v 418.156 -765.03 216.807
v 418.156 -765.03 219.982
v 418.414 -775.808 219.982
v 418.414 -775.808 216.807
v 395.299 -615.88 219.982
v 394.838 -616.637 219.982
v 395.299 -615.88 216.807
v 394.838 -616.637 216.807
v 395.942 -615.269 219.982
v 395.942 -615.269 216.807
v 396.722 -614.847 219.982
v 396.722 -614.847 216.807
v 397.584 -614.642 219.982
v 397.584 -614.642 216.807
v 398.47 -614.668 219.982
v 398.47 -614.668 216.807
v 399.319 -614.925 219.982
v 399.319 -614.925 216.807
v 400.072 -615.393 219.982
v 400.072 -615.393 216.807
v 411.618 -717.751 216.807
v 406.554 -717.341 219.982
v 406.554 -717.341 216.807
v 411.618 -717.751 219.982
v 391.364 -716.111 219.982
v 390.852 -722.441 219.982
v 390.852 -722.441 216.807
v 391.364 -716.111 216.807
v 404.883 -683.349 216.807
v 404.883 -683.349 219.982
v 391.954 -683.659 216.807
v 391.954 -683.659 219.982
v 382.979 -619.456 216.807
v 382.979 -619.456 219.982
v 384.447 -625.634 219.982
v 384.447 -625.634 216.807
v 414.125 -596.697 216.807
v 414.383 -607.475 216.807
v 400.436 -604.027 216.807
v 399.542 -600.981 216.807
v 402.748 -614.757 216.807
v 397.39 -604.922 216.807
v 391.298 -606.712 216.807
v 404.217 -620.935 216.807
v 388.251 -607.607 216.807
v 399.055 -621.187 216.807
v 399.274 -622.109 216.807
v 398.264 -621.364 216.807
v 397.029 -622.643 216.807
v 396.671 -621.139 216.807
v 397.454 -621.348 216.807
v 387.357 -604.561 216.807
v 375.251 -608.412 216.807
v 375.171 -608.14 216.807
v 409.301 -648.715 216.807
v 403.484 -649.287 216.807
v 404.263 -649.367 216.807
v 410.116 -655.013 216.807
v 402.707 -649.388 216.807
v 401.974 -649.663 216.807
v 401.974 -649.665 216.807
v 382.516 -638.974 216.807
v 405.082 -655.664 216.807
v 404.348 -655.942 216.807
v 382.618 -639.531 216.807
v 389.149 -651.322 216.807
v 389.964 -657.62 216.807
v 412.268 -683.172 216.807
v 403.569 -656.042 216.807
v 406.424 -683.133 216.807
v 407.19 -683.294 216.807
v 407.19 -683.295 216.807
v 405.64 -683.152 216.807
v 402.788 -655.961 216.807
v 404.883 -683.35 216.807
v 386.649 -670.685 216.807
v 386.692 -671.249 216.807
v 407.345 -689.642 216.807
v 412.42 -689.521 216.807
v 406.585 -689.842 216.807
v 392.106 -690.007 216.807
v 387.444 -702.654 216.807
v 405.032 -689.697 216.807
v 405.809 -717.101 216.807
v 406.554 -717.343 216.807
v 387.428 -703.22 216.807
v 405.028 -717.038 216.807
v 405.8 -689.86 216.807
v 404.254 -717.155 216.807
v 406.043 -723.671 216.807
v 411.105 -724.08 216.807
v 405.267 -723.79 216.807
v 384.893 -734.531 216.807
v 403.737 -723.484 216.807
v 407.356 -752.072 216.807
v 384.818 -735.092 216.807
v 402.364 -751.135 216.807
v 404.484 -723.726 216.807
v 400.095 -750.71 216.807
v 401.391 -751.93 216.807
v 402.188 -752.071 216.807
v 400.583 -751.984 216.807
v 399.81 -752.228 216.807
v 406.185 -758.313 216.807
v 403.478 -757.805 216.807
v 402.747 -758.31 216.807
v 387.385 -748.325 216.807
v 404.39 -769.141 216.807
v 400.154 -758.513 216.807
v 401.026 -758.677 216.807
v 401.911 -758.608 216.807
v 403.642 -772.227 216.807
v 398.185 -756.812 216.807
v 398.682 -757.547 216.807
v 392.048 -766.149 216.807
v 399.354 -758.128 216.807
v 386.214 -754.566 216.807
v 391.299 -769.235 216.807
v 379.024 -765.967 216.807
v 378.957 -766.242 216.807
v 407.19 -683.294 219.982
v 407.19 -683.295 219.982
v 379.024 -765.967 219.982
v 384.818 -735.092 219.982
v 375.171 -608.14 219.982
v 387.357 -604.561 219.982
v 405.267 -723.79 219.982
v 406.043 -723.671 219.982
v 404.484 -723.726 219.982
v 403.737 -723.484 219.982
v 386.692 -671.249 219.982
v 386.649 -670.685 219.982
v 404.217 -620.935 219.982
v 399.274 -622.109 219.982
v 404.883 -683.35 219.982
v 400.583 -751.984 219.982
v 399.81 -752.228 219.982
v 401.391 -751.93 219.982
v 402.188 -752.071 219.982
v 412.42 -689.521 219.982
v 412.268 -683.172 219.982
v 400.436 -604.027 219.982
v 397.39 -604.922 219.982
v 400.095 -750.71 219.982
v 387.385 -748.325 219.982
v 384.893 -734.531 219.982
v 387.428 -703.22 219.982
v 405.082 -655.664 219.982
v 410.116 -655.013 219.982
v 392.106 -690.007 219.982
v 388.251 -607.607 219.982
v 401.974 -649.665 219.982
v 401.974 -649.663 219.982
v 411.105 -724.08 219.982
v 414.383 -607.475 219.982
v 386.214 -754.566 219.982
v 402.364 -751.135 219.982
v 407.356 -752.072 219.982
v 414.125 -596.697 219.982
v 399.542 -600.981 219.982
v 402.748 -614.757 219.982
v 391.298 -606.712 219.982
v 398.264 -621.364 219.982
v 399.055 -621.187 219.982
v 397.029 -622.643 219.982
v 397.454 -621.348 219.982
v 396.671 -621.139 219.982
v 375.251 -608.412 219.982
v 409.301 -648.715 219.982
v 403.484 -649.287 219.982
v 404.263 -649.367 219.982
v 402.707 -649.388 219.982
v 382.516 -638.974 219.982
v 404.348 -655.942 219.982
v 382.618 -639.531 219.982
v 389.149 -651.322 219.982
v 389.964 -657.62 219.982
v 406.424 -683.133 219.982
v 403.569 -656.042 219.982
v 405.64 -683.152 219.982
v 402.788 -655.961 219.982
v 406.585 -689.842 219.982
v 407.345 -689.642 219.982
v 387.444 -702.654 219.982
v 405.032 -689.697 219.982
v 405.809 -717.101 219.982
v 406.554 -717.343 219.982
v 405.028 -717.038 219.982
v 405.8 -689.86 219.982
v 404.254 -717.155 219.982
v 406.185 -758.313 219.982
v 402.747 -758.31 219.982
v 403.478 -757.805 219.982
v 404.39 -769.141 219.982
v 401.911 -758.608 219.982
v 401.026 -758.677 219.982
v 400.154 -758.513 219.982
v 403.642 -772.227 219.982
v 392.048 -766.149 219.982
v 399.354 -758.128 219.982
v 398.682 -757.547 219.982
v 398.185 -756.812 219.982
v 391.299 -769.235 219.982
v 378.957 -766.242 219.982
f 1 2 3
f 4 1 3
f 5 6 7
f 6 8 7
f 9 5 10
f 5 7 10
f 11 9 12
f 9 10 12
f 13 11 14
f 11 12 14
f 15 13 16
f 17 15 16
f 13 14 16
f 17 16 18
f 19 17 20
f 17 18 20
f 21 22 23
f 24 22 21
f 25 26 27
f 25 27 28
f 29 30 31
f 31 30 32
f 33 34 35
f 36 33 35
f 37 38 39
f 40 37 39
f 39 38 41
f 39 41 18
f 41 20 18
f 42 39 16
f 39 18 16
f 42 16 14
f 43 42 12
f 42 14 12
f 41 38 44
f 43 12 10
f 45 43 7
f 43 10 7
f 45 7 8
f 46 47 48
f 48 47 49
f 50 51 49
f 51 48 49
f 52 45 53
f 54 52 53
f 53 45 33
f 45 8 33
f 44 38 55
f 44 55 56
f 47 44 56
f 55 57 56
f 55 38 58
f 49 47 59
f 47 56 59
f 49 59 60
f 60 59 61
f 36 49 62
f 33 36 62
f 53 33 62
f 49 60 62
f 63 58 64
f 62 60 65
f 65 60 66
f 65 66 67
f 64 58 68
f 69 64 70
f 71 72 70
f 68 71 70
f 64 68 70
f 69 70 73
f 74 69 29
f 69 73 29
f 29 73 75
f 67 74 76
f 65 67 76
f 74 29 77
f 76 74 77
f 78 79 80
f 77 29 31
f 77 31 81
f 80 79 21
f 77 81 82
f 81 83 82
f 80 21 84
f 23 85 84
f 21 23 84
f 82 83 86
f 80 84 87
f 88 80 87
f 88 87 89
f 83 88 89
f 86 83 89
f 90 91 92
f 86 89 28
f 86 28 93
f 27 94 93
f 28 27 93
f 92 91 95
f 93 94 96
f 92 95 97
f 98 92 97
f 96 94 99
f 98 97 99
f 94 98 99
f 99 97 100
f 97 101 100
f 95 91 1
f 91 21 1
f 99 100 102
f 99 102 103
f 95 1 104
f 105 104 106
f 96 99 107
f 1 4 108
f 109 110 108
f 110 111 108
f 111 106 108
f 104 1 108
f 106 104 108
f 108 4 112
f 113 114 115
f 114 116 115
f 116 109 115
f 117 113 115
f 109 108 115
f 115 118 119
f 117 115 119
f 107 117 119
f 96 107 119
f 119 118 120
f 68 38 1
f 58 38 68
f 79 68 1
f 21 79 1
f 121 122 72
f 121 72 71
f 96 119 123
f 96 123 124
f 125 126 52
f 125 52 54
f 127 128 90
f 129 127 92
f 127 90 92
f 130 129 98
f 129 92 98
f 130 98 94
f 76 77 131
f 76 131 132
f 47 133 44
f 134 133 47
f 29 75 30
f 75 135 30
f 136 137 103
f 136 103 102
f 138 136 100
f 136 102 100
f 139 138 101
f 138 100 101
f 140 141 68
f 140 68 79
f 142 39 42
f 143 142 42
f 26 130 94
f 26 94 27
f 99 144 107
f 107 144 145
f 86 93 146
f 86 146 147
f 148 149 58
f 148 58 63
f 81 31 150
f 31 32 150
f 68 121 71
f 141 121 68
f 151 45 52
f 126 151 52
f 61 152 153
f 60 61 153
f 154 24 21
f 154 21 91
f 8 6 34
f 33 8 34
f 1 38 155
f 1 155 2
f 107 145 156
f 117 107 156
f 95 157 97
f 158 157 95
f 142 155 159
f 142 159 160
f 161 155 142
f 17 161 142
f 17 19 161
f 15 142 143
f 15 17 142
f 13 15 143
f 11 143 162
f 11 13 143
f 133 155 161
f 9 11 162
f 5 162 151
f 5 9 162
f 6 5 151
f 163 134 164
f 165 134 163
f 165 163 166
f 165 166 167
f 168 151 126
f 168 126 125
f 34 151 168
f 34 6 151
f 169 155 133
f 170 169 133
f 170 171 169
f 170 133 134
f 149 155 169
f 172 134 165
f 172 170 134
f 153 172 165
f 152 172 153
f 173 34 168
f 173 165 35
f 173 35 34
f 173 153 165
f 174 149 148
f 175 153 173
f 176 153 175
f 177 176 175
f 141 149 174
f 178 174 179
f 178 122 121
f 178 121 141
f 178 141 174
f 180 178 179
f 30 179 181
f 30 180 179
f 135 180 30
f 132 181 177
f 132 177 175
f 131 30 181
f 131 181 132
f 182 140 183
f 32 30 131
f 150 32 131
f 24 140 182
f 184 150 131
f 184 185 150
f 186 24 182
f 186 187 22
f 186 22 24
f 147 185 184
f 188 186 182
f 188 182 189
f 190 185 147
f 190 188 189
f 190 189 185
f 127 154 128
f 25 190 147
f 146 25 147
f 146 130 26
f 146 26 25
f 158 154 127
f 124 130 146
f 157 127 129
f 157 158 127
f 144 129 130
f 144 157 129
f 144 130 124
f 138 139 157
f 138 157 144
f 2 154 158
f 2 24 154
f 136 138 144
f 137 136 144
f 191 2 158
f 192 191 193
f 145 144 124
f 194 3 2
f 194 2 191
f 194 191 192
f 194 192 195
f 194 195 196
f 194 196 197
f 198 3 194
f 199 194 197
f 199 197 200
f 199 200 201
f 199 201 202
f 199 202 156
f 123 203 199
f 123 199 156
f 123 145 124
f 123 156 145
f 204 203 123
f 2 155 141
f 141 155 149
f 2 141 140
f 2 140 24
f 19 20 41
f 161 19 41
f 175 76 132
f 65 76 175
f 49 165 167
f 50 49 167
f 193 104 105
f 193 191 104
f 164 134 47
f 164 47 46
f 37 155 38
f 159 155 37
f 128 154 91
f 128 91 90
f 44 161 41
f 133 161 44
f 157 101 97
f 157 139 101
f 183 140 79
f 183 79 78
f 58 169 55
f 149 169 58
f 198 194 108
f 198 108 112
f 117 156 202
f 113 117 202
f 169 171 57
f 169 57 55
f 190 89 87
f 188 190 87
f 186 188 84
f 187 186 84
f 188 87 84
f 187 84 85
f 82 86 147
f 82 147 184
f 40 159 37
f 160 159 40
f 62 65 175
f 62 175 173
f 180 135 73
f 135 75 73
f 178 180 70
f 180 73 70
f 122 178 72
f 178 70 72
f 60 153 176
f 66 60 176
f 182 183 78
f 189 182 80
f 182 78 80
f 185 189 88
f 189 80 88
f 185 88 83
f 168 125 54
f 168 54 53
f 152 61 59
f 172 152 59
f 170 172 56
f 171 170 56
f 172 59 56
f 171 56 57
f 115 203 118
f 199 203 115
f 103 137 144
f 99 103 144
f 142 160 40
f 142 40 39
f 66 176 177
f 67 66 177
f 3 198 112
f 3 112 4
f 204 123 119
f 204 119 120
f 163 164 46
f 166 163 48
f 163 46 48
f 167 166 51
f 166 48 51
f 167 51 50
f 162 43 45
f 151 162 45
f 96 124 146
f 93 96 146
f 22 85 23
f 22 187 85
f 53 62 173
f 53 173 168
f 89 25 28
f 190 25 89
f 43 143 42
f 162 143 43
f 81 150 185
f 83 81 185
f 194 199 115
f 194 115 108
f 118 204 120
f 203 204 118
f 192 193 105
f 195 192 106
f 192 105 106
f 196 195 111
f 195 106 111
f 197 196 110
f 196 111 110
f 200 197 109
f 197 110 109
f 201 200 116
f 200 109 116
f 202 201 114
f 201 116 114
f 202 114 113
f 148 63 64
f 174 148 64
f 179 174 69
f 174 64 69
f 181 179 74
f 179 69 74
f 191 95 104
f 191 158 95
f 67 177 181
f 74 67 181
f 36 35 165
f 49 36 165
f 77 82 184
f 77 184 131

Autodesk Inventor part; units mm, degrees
ref_plane "YZ Plane" through (0, 0, 0) normal (1, 0, 0) x (0, 1, 0)
ref_plane "XZ Plane" through (0, 0, 0) normal (0, 1, 0) x (-1, 0, 0)
ref_plane "Work Plane2" through (388.0538, -686.9281, 216.8066) normal (0, 0, 1) x (-0.9917, -0.1283, 0)
sketch "Sketch3" plane through (388.0538, -686.9281, 216.8066) normal (0, 0, 1) x (-0.9917, -0.1283, 0)
  line L0 (4.3583, 15.8159) -> (10.8533, 46.3726) construction
  line L1 (1.0044, -15.8113) -> (4.2698, 15.2569) construction
  line L2 (1.0044, -15.8113) -> (4.2698, 15.2569) construction
  line L3 (0.9748, -47.6157) -> (0.9748, -16.3764) construction
  line L4 (0.9748, -47.6157) -> (0.9748, -16.3764) construction
  line L5 (4.2698, -79.2491) -> (1.0044, -48.1809) construction
  line L6 (4.2698, -79.2491) -> (1.0044, -48.1809) construction
  line L7 (10.9998, 46.9192) -> (20.6533, 76.6296) construction
  line L8 (4.3583, 15.8159) -> (10.8533, 46.3726) construction
  line L9 (10.9998, 46.9192) -> (20.6533, 76.6296) construction
  line L10 (20.6533, 76.6296) -> (-103.8397, 124.4179) construction
  line L11 (-117.8064, 81.4327) -> (10.9998, 46.9192) construction
  line L12 (10.8533, 46.3726) -> (-117.9529, 80.8861) construction
  line L13 (-127.3499, 36.6764) -> (4.3583, 15.8159) construction
  line L14 (4.2698, 15.2569) -> (-127.4385, 36.1175) construction
  line L15 (0.9748, -16.3764) -> (-132.1925, -9.3974) construction
  line L16 (-132.1629, -8.8323) -> (1.0044, -15.8113) construction
  line L17 (1.0044, -48.1809) -> (-132.1629, -55.1599) construction
  line L18 (-132.1925, -54.5947) -> (0.9748, -47.6157) construction
  line L19 (-127.4385, -100.1096) -> (4.2698, -79.2491) construction
  line L20 (19.0965, 77.2271) -> (9.3891, 47.3508)
  line L21 (9.3891, 47.3508) -> (9.2426, 46.8041)
  line L22 (9.2426, 46.8041) -> (2.7113, 16.0767)
  line L23 (2.7113, 16.0767) -> (2.6228, 15.5178)
  line L24 (2.6228, 15.5178) -> (-0.6609, -15.724)
  line L25 (-0.6609, -15.724) -> (-0.6905, -16.2891)
  line L26 (-0.6905, -16.2891) -> (-0.6905, -47.703)
  line L27 (-0.6905, -47.703) -> (-0.6609, -48.2681)
  line L28 (-0.6609, -48.2681) -> (2.6228, -79.5099)
  line L29 (2.6228, -79.5099) -> (-36.3059, -75.4184)
  line L30 (-36.3059, -75.4184) -> (-19.8322, 81.3187)
  line L31 (-19.8322, 81.3187) -> (19.0965, 77.2271)
  line L32 (-127.4385, 36.1175) -> (-129.1369, 19.9578) construction
  point P0 (296.7492, -731.0239)
  dimension "d32" = 1.6652
  dimension "d33" = 1.6652
  dimension "d34" = 1.6652
  dimension "d35" = 1.6652
  dimension "d36" = 1.6652
  dimension "d37" = 29.21
extrude "Extrusion3" add sketch "Sketch3" along normal blind 3.175
sketch "Sketch5" plane through (388.0538, -686.9281, 219.9816) normal (0, 0, 1) x (0.9917, 0.1283, 0)
  line L0 (-19.0965, -77.2271) -> (19.8322, -81.3187) projected
  line L1 (-19.0965, -77.2271) -> (-19.1979, -77.4913)
  line L2 (-19.1979, -77.4913) -> (-7.3415, -82.0426)
  line L3 (4.515, -86.5938) -> (18.7052, -92.0409)
  line L4 (19.8322, -81.3187) -> (36.3059, 75.4184) projected
  line L5 (19.8322, -81.3187) -> (18.7052, -92.0409)
  line L6 (-18.0601, -74.5272) -> (-19.1979, -77.4913) construction
  line L7 (36.3059, 75.4184) -> (37.4328, 86.1406)
  line L8 (37.4328, 86.1406) -> (22.4202, 83.7628)
  line L9 (9.8766, 81.7761) -> (-2.6671, 79.7894)
  line L10 (36.3059, 75.4184) -> (-2.6228, 79.5099) projected
  line L11 (-2.6671, 79.7894) -> (-2.6228, 79.5099)
  line L12 (-2.6671, 79.7894) -> (-2.1704, 76.6535) construction
  line L13 (1.5509, -85.456) -> (-4.3773, -83.1804) projected
  line L14 (2.6887, -82.4919) -> (1.5509, -85.456) projected
  line L15 (-3.2395, -80.2163) -> (2.6887, -82.4919) projected
  line L16 (-3.2395, -80.2163) -> (-4.3773, -83.1804) projected
  line L17 (19.781, 80.1302) -> (13.5092, 79.1369) projected
  line L18 (19.2843, 83.2662) -> (19.781, 80.1302) projected
  line L19 (13.0125, 82.2728) -> (19.2843, 83.2662) projected
  line L20 (13.0125, 82.2728) -> (13.5092, 79.1369) projected
  line L21 (-4.3773, -83.1804) -> (-7.3415, -82.0426) projected
  line L22 (-3.2395, -80.2163) -> (-4.3773, -83.1804) projected
  line L23 (-6.2036, -79.0785) -> (-3.2395, -80.2163) projected
  line L24 (-7.3415, -82.0426) -> (-6.2036, -79.0785) projected
  line L25 (4.515, -86.5938) -> (1.5509, -85.456) projected
  line L26 (5.6528, -83.6297) -> (4.515, -86.5938) projected
  line L27 (2.6887, -82.4919) -> (5.6528, -83.6297) projected
  line L28 (2.6887, -82.4919) -> (1.5509, -85.456) projected
  line L29 (22.9169, 80.6269) -> (19.781, 80.1302) projected
  line L30 (22.4202, 83.7628) -> (22.9169, 80.6269) projected
  line L31 (19.2843, 83.2662) -> (22.4202, 83.7628) projected
  line L32 (19.2843, 83.2662) -> (19.781, 80.1302) projected
  line L33 (13.5092, 79.1369) -> (10.3733, 78.6402) projected
  line L34 (13.0125, 82.2728) -> (13.5092, 79.1369) projected
  line L35 (9.8766, 81.7761) -> (13.0125, 82.2728) projected
  line L36 (10.3733, 78.6402) -> (9.8766, 81.7761) projected
  point P0 (-296.7492, 731.0239)
  point P1 (19.781, 80.1302)
  point P2 (13.5092, 79.1369)
  point P3 (2.6887, -82.4919)
extrude "Extrusion4" add sketch "Sketch5" against normal blind 3.175 contours L10 L11 L9 L36 L33 L17 L29 L30 L8 L7 | L0 L5 L3 L26 L27 L15 L23 L24 L2 L1
sketch "Sketch6" plane through (388.0538, -686.9281, 219.9816) normal (0, 0, 1) x (0.9917, 0.1283, 0)
  line L0 (16.6451, 79.6336) -> (18.6318, 67.0899) construction
  line L1 (-0.2754, -81.3541) -> (4.2759, -69.4976) construction
  line L2 (18.7052, -92.0409) -> (37.4328, 86.1406) construction
  line L3 (28.069, -2.9502) -> (17.9647, -1.8882) construction
  line L4 (-6.2036, -79.0785) -> (5.6528, -83.6297) construction
  line L5 (22.9169, 80.6269) -> (10.3733, 78.6402) construction
  point P0 (-296.7492, 731.0239)
  dimension "d23" = 12.7
  dimension "d24" = 12.7
  dimension "d55" = 10.16
hole "Hole2" at (401.2076, -755.3034, 219.9816) at (397.9274, -618.0027, 219.9816) at (406.1123, -686.4967, 219.9816) direction (0, 0, -1) diameter 6.7564 depth 13.6144 clearance for "Flat Head Machine Screw (82)" size "1/4" standard "Ansi Unified Screw Threads"
sketch "Sketch7" plane through (388.0538, -686.9281, 219.9816) normal (0, 0, 1) x (0.9917, 0.1283, 0)
  line L0 (0.6609, 15.724) -> (-2.6228, -15.5178) construction
  line L1 (-0.981, 0.1031) -> (10.3864, -1.0917) construction
  line L2 (3.6239, -3.5734) -> (16.4852, -4.9251)
  line L3 (16.4852, -4.9251) -> (17.1489, 1.3901)
  line L4 (17.1489, 1.3901) -> (4.2877, 2.7418)
  line L5 (4.2877, 2.7418) -> (3.6239, -3.5734)
  line L6 (3.6239, -3.5734) -> (17.1489, 1.3901) construction
  line L7 (16.4852, -4.9251) -> (4.2877, 2.7418) construction
  circle A0 centre (17.9647, -1.8882) radius 3.3782 construction
  line L8 (10.8679, -38.2669) -> (-1.7816, -35.5781)
  line L9 (-1.7816, -35.5781) -> (-0.4614, -29.3669)
  line L10 (-0.4614, -29.3669) -> (12.1881, -32.0556)
  line L11 (12.1881, -32.0556) -> (10.8679, -38.2669)
  line L12 (10.8679, -38.2669) -> (-0.4614, -29.3669) construction
  line L13 (-1.7816, -35.5781) -> (12.1881, -32.0556) construction
  line L14 (-10.5029, -66.8425) -> (1.7962, -70.8387)
  line L15 (1.7962, -70.8387) -> (3.7585, -64.7995)
  line L16 (3.7585, -64.7995) -> (-8.5407, -60.8033)
  line L17 (-8.5407, -60.8033) -> (-10.5029, -66.8425)
  line L18 (-10.5029, -66.8425) -> (3.7585, -64.7995) construction
  line L19 (1.7962, -70.8387) -> (-8.5407, -60.8033) construction
  line L20 (18.5865, 35.1711) -> (5.6544, 35.1711)
  line L21 (5.6544, 35.1711) -> (5.6544, 28.8211)
  line L22 (5.6544, 28.8211) -> (18.5865, 28.8211)
  line L23 (18.5865, 28.8211) -> (18.5865, 35.1711)
  line L24 (18.5865, 35.1711) -> (5.6544, 28.8211) construction
  line L25 (5.6544, 35.1711) -> (18.5865, 28.8211) construction
  line L26 (3.6239, 67.5655) -> (4.2877, 61.2503)
  line L27 (4.2877, 61.2503) -> (17.1489, 62.6021)
  line L28 (17.1489, 62.6021) -> (16.4852, 68.9173)
  line L29 (16.4852, 68.9173) -> (3.6239, 67.5655)
  line L30 (3.6239, 67.5655) -> (17.1489, 62.6021) construction
  line L31 (4.2877, 61.2503) -> (16.4852, 68.9173) construction
  line L32 (-9.3891, -47.3508) -> (-19.0965, -77.2271) construction
  line L33 (-14.2428, -62.289) -> (-3.3722, -65.821) construction
  line L34 (-2.7113, -16.0767) -> (-9.2426, -46.8041) construction
  line L35 (-5.977, -31.4404) -> (5.2033, -33.8169) construction
  line L36 (0.6905, 47.703) -> (0.6905, 16.2891) construction
  line L37 (0.6905, 31.9961) -> (12.1205, 31.9961) construction
  line L38 (-2.6228, 79.5099) -> (0.6609, 48.2681) construction
  line L39 (-0.981, 63.889) -> (10.3864, 65.0838) construction
  line L40 (18.7804, -5.1664) -> (19.4442, 1.1488)
  line L41 (19.4442, 1.1488) -> (24.4964, 0.6178)
  line L42 (24.4964, 0.6178) -> (23.8326, -5.6974)
  line L43 (23.8326, -5.6974) -> (18.7804, -5.1664)
  line L44 (18.7804, -5.1664) -> (24.4964, 0.6178) construction
  line L45 (19.4442, 1.1488) -> (23.8326, -5.6974) construction
  line L46 (13.1254, -38.7467) -> (14.4456, -32.5355)
  line L47 (14.4456, -32.5355) -> (19.4146, -33.5916)
  line L48 (19.4146, -33.5916) -> (18.0943, -39.8029)
  line L49 (18.0943, -39.8029) -> (13.1254, -38.7467)
  line L50 (13.1254, -38.7467) -> (19.4146, -33.5916) construction
  line L51 (14.4456, -32.5355) -> (18.0943, -39.8029) construction
  line L52 (20.8944, 28.8211) -> (20.8944, 35.1711)
  line L53 (20.8944, 35.1711) -> (25.9744, 35.1711)
  line L54 (25.9744, 35.1711) -> (25.9744, 28.8211)
  line L55 (25.9744, 28.8211) -> (20.8944, 28.8211)
  line L56 (20.8944, 28.8211) -> (25.9744, 35.1711) construction
  line L57 (20.8944, 35.1711) -> (25.9744, 28.8211) construction
  line L58 (3.9912, -71.5519) -> (5.9534, -65.5127)
  line L59 (5.9534, -65.5127) -> (10.7848, -67.0825)
  line L60 (10.7848, -67.0825) -> (8.8225, -73.1217)
  line L61 (8.8225, -73.1217) -> (3.9912, -71.5519)
  line L62 (3.9912, -71.5519) -> (10.7848, -67.0825) construction
  line L63 (5.9534, -65.5127) -> (8.8225, -73.1217) construction
  line L64 (19.4442, 62.8433) -> (18.7804, 69.1585)
  line L65 (18.7804, 69.1585) -> (23.8326, 69.6895)
  line L66 (23.8326, 69.6895) -> (24.4964, 63.3743)
  line L67 (24.4964, 63.3743) -> (19.4442, 62.8433)
  line L68 (19.4442, 62.8433) -> (23.8326, 69.6895) construction
  line L69 (18.7804, 69.1585) -> (24.4964, 63.3743) construction
  point P0 (-296.7492, 731.0239)
  point P1 (5.2033, -33.8169)
  point P2 (-3.3722, -65.821)
  point P3 (12.1205, 31.9961)
  point P4 (10.3864, 65.0838)
  point P5 (21.6384, -2.2743)
  dimension "d38" = 11.43
  dimension "d39" = 6.35
  dimension "d40" = 12.9321
  dimension "d41" = 11.43
  dimension "d42" = 11.43
  dimension "d43" = 11.43
  dimension "d44" = 11.43
  dimension "d45" = 6.35
  dimension "d46" = 6.35
  dimension "d47" = 6.35
  dimension "d48" = 6.35
  dimension "d49" = 12.9321
  dimension "d50" = 12.9321
  dimension "d51" = 12.9321
  dimension "d52" = 12.9321
  dimension "d66" = 6.35
  dimension "d67" = 5.08
  dimension "d68" = 2.3079
  dimension "d69" = 6.35
  dimension "d70" = 5.08
  dimension "d71" = 6.35
  dimension "d72" = 5.08
  dimension "d73" = 6.35
  dimension "d74" = 5.08
  dimension "d75" = 6.35
  dimension "d76" = 5.08
  dimension "d77" = 2.3079
  dimension "d78" = 2.3079
  dimension "d79" = 2.3079
  dimension "d80" = 2.3079
extrude "Extrusion5" cut sketch "Sketch7" against normal blind 3.175
sketch "Sketch8" plane through (388.0538, -686.9281, 219.9816) normal (0, 0, 1) x (0.9917, 0.1283, 0)
  line L0 (0.6609, 15.724) -> (-2.6228, -15.5178) construction
  arc A0 (16.4852, -4.9251) -> (17.1489, 1.3901) centre (17.9647, -1.8882) ccw construction
  line L1 (18.5865, 35.1711) -> (18.5865, 28.8211) construction
  line L2 (18.5865, 31.9961) -> (19.7405, 31.9961) construction
  line L3 (0.6905, 47.703) -> (0.6905, 16.2891) construction
  line L4 (10.8679, -38.2669) -> (12.1881, -32.0556) construction
  line L5 (11.528, -35.1612) -> (12.6567, -35.4012) construction
  line L6 (-2.7113, -16.0767) -> (-9.2426, -46.8041) construction
  point P0 (-296.7492, 731.0239)
  point P1 (-0.6491, 3.2607)
  point P2 (0.6905, 35.1711)
  point P3 (-5.3169, -28.3348)
  dimension "d56" = 19.05
  dimension "d57" = 19.05
  dimension "d58" = 19.05
hole "Hole3" at (403.5277, -652.6645, 219.9816) at (405.1463, -720.4137, 219.9816) direction (0, 0, -1) diameter 6.7564 depth 13.6144 clearance for "Flat Head Machine Screw (82)" size "1/4" standard "Ansi Unified Screw Threads"
equation "\"d33\" = d32"
equation "\"d34\" = d32"
equation "\"d36\" = d32"
equation "\"d41\" = d38"
equation "\"d42\" = d38"
equation "\"d43\" = d38"
equation "\"d44\" = d38"
equation "\"d45\" = d39"
equation "\"d46\" = d39"
equation "\"d47\" = d39"
equation "\"d48\" = d39"
equation "\"d49\" = d40"
equation "\"d50\" = d40"
equation "\"d51\" = d40"
equation "\"d52\" = d40"
equation "\"d57\" = d56"
equation "\"d58\" = d56"
properties part number "Back Plate" material "Aluminum 6061"
